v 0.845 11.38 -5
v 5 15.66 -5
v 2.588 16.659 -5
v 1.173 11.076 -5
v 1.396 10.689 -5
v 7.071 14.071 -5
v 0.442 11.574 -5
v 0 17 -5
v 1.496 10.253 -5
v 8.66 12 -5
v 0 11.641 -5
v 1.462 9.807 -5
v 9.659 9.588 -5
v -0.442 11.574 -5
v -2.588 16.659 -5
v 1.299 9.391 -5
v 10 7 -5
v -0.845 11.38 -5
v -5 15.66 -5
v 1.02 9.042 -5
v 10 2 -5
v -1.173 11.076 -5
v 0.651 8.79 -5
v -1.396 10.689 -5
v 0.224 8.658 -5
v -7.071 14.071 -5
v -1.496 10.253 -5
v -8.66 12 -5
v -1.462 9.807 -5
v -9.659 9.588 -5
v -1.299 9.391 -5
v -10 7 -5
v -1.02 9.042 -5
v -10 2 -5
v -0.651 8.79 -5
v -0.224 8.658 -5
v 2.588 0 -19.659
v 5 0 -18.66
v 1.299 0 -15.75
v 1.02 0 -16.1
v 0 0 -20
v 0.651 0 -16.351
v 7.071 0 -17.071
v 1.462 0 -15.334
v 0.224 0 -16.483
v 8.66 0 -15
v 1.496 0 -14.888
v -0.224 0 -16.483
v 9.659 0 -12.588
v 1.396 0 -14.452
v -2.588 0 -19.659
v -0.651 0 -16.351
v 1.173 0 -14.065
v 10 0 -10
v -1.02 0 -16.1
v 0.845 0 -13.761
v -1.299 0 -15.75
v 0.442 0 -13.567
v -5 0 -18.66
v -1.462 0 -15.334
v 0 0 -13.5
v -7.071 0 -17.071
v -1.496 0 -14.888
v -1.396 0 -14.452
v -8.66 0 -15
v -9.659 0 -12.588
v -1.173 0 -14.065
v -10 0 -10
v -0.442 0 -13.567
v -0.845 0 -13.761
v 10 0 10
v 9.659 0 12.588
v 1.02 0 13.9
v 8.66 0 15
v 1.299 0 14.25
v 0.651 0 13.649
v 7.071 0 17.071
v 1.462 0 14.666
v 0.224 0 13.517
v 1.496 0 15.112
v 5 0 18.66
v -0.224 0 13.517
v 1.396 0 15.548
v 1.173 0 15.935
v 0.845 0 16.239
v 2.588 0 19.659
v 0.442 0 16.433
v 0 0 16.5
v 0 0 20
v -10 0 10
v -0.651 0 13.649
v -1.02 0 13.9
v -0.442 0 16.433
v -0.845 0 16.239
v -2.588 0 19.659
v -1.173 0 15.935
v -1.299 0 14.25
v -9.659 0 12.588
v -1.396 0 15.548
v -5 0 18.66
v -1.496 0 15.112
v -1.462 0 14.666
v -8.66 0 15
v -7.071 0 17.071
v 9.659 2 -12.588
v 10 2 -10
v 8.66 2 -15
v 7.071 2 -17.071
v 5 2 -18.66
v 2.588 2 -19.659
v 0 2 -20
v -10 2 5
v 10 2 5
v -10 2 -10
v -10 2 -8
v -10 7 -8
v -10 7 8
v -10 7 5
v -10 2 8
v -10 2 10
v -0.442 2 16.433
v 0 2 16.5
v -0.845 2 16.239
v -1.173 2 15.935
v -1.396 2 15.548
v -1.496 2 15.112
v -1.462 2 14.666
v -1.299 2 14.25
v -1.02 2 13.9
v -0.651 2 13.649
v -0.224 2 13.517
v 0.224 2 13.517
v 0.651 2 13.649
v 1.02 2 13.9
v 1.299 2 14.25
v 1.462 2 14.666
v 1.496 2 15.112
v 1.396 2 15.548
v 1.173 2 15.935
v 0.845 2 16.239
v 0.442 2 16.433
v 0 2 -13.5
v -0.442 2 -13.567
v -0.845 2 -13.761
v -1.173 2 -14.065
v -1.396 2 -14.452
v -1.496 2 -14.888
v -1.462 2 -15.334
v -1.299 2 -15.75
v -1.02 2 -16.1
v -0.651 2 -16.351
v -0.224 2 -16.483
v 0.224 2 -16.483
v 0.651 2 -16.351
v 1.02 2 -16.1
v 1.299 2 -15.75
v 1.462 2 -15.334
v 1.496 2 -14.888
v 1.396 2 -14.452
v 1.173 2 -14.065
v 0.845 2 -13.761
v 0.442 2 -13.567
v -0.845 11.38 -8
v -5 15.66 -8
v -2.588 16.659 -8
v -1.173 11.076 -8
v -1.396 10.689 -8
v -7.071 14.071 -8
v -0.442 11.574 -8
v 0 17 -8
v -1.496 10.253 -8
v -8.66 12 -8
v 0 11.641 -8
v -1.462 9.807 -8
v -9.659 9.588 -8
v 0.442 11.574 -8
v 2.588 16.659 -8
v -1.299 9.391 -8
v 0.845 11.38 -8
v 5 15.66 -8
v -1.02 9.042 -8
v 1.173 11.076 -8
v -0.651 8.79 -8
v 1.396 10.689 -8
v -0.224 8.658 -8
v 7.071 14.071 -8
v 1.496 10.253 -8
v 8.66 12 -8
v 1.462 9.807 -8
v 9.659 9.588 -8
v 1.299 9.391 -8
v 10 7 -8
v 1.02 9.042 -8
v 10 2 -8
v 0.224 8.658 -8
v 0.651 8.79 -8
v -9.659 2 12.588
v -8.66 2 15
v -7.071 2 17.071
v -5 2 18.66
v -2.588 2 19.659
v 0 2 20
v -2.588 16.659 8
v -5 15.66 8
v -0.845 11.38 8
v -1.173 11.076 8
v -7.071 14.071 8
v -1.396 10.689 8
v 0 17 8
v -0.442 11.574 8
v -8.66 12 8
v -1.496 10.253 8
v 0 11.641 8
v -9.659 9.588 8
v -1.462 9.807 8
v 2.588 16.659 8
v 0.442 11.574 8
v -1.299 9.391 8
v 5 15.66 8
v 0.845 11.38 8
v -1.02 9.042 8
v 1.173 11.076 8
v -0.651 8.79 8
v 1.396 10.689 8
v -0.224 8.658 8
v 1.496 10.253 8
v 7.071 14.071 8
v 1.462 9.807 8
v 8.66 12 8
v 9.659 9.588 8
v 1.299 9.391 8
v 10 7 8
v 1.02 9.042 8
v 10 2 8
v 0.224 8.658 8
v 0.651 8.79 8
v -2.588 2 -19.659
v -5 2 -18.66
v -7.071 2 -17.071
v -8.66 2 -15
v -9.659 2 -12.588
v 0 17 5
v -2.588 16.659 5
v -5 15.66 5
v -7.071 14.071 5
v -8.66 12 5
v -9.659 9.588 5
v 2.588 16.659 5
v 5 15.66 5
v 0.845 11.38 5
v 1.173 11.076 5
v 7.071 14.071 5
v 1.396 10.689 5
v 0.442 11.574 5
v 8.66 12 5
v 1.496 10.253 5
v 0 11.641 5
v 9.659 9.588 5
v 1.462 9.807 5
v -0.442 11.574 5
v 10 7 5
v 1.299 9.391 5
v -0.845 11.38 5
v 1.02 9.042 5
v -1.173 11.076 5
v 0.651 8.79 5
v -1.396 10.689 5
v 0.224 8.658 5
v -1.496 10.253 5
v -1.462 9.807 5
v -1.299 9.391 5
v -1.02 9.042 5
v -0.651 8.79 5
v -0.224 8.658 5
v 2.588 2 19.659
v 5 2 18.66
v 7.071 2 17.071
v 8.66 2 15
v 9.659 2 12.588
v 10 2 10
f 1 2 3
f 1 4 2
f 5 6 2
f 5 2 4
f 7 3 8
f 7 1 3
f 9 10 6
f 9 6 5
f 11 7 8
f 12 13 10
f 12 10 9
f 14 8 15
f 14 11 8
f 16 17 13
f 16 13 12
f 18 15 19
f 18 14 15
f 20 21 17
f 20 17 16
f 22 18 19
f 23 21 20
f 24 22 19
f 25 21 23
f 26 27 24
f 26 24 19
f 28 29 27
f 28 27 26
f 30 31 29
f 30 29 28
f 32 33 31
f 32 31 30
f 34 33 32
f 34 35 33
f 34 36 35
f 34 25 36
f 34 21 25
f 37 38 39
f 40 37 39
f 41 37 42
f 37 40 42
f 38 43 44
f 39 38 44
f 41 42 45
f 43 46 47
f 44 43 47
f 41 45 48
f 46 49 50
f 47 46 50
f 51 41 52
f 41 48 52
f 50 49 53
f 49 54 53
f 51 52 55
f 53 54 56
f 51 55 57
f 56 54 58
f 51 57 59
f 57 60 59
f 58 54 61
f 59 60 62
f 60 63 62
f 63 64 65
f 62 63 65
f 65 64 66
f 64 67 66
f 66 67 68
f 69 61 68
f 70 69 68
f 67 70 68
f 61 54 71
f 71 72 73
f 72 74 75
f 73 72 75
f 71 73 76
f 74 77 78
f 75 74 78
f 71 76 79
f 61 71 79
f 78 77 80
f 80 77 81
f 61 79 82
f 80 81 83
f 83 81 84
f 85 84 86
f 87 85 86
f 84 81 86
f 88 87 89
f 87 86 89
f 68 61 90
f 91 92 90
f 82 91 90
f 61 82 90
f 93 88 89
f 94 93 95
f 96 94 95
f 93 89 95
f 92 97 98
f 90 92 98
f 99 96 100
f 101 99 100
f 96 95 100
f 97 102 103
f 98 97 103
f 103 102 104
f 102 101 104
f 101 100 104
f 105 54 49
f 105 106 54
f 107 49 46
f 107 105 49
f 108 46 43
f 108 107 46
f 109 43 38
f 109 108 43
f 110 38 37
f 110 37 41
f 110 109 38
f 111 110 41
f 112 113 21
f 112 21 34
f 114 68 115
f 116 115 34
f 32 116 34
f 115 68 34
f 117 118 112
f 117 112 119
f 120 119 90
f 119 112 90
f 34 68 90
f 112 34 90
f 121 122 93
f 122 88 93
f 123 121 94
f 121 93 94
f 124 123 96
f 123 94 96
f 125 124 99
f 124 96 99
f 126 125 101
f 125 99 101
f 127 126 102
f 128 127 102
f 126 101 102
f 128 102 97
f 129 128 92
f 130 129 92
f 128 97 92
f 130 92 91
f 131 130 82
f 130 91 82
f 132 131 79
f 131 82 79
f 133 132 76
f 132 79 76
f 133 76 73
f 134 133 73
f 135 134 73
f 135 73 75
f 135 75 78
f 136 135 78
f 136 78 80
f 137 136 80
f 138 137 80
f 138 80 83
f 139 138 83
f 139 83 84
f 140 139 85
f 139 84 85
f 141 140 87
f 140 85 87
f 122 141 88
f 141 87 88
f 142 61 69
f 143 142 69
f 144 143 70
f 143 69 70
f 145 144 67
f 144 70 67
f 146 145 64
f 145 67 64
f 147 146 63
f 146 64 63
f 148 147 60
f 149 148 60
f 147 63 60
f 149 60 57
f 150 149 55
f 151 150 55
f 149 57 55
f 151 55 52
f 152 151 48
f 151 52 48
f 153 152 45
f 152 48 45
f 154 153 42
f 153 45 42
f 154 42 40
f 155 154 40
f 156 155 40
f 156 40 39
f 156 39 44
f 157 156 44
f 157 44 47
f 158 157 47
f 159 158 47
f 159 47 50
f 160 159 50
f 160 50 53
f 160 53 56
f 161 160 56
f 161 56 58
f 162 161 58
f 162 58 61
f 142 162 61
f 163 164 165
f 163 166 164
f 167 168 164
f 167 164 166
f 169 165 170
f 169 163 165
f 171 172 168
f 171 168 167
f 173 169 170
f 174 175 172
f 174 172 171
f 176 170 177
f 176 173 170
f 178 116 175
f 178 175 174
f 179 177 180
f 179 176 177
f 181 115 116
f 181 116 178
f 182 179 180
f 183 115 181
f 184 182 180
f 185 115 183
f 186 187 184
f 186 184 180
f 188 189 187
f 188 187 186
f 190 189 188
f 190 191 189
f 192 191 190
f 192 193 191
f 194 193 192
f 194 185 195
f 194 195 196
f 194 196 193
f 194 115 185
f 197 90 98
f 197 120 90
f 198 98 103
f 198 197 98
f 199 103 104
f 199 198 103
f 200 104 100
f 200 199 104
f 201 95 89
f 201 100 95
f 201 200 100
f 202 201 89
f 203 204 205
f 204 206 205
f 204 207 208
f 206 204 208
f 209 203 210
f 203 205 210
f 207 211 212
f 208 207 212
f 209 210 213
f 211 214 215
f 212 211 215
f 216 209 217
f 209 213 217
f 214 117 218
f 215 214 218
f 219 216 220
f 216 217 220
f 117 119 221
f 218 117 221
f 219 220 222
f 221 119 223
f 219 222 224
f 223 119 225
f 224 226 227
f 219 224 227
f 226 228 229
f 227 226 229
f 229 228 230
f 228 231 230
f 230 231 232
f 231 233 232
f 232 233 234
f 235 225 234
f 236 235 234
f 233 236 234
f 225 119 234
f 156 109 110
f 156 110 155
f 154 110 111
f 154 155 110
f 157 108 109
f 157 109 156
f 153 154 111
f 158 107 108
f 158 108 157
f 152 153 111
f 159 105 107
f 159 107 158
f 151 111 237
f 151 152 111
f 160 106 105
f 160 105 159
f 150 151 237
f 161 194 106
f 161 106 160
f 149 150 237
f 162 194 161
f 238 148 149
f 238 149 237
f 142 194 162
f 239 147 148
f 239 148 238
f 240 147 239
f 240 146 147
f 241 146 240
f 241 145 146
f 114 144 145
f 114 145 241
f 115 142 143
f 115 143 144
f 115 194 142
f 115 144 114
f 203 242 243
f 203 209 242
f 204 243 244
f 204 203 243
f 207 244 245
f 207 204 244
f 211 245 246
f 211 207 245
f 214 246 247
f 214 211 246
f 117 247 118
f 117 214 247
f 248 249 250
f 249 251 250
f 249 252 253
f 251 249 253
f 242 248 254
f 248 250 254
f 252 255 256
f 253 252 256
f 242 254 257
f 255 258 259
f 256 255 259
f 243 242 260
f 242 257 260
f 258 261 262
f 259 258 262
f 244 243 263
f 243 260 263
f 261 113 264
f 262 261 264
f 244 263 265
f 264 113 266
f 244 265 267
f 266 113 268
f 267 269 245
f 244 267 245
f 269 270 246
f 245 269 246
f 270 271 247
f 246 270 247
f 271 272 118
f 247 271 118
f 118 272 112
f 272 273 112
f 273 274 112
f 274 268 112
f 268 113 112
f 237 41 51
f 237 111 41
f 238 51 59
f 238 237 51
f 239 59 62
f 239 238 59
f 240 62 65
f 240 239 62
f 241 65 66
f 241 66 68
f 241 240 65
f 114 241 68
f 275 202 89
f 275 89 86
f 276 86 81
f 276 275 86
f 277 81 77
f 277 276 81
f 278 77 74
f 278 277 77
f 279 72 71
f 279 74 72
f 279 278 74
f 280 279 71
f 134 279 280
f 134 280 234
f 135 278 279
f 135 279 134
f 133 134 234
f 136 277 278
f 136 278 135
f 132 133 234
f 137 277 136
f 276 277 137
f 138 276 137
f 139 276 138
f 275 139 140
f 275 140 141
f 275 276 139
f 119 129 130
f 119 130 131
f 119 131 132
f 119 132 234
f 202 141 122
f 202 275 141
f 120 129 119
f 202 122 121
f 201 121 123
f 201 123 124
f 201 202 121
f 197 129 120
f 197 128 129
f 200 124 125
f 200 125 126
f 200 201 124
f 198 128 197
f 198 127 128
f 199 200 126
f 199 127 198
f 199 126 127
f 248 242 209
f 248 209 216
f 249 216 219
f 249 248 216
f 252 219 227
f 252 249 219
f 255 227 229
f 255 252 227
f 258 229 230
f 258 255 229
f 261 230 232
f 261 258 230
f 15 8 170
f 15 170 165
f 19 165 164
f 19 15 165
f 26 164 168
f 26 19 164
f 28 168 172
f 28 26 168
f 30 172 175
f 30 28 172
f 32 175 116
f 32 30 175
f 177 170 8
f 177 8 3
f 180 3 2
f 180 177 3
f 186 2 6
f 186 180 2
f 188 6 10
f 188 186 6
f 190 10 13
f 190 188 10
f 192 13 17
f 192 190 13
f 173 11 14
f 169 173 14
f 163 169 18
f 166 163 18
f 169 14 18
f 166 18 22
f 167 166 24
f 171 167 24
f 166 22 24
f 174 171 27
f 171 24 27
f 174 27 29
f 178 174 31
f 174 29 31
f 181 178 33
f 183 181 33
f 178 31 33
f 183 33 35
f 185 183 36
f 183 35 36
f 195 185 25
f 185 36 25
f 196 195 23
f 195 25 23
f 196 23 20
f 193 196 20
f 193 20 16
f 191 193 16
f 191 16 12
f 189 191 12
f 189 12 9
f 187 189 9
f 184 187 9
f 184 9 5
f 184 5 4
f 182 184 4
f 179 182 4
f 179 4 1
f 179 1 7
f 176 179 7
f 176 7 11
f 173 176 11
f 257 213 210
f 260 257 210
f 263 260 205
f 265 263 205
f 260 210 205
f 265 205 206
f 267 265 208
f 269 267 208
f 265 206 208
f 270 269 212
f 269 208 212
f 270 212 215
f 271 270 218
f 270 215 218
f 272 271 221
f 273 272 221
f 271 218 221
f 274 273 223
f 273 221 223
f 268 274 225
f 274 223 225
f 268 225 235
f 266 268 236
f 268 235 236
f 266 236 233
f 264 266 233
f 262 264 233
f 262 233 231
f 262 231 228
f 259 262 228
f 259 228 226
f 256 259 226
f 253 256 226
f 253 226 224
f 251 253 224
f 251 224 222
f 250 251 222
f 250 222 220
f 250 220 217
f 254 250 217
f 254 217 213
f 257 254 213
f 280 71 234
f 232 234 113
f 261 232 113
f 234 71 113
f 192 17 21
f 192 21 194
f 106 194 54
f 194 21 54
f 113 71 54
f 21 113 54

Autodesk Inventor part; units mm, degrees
ref_plane "YZ Plane" through (0, 0, 0) normal (1, 0, 0) x (0, 1, 0)
ref_plane "XZ Plane" through (0, 0, 0) normal (0, 1, 0) x (-1, 0, 0)
ref_plane "XY Plane" through (0, 0, 0) normal (0, 0, 1) x (1, 0, 0)
sketch "Sketch1" plane through (0, 0, 0) normal (0, 1, 0) x (-1, 0, 0)
  line L0 (-10, -20) -> (10, -20)
  line L1 (10, -20) -> (10, 20)
  line L2 (10, 20) -> (-10, 20)
  line L3 (-10, 20) -> (-10, -20)
  line L4 (-10, -20) -> (10, 20) construction
  line L5 (10, -20) -> (-10, 20) construction
  point P0 (0, 0)
  dimension "d0" = 20
  dimension "d1" = 40
extrude "Extrusion1" add sketch "Sketch1" along normal blind 2
sketch "Sketch3" plane through (0, 2, 0) normal (0, 1, 0) x (1, 0, 0)
  line L0 (-10, 20) -> (-10, -20) projected
  line L1 (10, -20) -> (10, 20) projected
  line L2 (-10, -8) -> (10, -8)
  line L3 (10, -8) -> (10, -5)
  line L4 (10, -5) -> (-10, -5)
  line L5 (-10, -5) -> (-10, -8)
  line L6 (-6.0097, 0) -> (5.0263, 0)
  line L7 (-10, 8) -> (10, 8)
  line L8 (10, 8) -> (10, 5)
  line L9 (10, 5) -> (-10, 5)
  line L10 (-10, 5) -> (-10, 8)
  point P0 (0, 0)
  dimension "d6" = 3
  dimension "d7" = 5
extrude "Extrusion2" add sketch "Sketch3" along normal blind 15 contours L7 L1 L9 L0 | L4 L1 L2 L0
fillet "Fillet1" radius 10 4 edges at (10, 17, 6.5) (-10, 17, 6.5) (10, 17, -6.5) (-10, 17, -6.5)
sketch "Sketch4" plane through (0, 2, 0) normal (0, 1, 0) x (1, 0, 0)
  line L0 (10, 20) -> (-10, 20) projected
  line L1 (-10, -20) -> (10, -20) projected
  point P0 (0, 0)
  point P1 (0, 15)
  point P2 (0, -15)
  dimension "d11" = 5
  dimension "d12" = 5
hole "Hole1" at (0, 2, -15) at (0, 2, 15) direction (0, -1, 0) diameter 3 end through all
fillet "Fillet2" radius 10 4 edges at (10, 1, 20) (-10, 1, 20) (-10, 1, -20) (10, 1, -20)
sketch "Sketch5" plane through (10, 2, -8) normal (0, 0, -1) x (-1, 0, 0)
  point P0 (10, -2)
  point P1 (10, 8.1411)
hole "Hole2" at (0, 10.1411, -8) direction (0, 0, 1) diameter 3 end through all
properties part number "turretSupport" material "PC/ABS Plastic"
